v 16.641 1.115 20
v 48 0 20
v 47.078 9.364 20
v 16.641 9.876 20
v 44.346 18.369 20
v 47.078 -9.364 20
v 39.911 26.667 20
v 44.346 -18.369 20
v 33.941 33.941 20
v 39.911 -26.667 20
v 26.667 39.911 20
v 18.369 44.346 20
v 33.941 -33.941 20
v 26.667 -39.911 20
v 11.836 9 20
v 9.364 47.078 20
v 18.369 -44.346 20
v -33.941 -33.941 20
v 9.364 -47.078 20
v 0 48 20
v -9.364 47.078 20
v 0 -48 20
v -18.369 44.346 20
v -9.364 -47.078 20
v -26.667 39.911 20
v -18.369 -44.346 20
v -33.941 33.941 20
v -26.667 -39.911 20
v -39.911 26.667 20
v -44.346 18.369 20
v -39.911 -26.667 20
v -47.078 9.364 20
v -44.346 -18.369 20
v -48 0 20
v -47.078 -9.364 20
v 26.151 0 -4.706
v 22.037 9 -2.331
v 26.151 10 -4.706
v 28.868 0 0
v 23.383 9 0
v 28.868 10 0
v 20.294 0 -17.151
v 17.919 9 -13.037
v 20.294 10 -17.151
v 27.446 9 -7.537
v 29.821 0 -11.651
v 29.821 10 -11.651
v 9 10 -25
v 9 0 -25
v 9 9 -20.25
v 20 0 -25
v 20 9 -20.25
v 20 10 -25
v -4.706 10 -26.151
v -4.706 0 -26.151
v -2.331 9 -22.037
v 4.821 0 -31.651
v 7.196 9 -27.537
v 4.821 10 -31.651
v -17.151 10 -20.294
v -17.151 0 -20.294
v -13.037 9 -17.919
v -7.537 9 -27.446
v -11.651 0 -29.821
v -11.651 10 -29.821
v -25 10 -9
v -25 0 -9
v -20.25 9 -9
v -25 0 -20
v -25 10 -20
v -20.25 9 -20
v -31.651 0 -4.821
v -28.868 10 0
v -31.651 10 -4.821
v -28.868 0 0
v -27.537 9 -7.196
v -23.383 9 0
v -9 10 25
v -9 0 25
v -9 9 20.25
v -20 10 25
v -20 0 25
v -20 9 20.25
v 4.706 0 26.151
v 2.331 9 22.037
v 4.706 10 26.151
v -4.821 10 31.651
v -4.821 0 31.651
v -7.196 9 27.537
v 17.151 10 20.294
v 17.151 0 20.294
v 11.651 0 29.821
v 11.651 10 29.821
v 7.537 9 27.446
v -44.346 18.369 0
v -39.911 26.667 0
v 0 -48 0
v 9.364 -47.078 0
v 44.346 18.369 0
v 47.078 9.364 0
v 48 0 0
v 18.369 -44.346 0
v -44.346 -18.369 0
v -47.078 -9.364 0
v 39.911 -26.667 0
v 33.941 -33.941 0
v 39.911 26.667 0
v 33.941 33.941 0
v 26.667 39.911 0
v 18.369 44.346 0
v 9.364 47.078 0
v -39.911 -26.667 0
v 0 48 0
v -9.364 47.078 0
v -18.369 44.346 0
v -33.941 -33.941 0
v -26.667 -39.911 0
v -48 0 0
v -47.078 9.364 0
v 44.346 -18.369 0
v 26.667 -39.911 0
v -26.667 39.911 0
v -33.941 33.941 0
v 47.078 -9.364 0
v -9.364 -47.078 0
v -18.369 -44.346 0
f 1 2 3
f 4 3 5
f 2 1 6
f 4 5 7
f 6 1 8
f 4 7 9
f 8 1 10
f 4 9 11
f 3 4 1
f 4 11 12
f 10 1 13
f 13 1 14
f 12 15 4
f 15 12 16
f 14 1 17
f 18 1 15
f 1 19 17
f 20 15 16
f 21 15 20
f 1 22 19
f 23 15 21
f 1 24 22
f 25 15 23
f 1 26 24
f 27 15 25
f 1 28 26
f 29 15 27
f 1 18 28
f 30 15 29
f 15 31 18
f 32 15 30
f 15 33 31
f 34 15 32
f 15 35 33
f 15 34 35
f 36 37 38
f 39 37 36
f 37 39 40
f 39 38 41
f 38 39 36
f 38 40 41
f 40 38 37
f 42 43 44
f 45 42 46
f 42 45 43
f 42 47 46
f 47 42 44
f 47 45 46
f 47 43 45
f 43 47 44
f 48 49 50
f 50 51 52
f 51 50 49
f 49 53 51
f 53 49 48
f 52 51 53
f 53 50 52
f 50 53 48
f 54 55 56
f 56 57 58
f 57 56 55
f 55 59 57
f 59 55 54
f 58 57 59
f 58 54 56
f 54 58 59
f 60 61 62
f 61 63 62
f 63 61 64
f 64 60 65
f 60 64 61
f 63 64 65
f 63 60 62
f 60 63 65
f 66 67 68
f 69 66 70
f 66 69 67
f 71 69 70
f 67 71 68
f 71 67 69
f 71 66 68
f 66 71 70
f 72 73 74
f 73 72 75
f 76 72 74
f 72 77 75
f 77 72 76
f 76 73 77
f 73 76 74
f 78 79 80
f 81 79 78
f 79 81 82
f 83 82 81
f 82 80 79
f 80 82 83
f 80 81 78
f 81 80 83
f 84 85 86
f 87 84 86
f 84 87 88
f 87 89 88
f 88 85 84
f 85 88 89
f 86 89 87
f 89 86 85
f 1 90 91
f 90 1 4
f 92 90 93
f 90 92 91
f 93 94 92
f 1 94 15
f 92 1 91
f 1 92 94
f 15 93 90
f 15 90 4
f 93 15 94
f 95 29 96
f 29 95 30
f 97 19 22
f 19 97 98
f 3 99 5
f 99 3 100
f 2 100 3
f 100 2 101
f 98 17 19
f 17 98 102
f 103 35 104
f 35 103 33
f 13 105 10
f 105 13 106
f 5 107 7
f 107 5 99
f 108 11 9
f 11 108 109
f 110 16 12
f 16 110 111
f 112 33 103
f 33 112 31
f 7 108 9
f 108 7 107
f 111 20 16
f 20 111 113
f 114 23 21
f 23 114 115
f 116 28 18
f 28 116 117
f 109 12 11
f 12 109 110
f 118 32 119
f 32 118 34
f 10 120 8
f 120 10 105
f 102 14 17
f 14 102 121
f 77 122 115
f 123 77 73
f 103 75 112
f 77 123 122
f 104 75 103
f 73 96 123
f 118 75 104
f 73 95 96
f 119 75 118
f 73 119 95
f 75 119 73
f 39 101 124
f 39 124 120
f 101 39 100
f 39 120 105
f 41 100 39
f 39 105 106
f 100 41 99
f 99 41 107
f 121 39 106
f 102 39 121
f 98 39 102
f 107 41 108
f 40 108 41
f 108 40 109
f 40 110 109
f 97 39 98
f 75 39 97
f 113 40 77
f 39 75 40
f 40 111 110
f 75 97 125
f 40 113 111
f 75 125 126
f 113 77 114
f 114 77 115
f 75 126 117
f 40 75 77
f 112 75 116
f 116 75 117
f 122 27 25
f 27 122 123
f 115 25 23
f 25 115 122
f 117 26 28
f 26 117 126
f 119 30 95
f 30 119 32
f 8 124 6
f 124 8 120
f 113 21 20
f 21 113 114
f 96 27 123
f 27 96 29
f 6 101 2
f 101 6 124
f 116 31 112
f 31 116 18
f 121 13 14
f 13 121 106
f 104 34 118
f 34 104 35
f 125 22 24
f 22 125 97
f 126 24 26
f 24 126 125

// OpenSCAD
$fn = 32;
// ----------------------------------------------------------------------
// G-code: round hub with 5 bolt holes
// ----------------------------------------------------------------------
// --- parameters (mm) ---
base_d = 96;            // outer diameter of the hub
base_t = 10;            // base thickness
hole_d = 6;             // bolt hole diameter
hole_n = 5;             // number of bolt holes
spoke = 12;             // number of spokes
spoke_t = 3.5;          // spoke thickness
spoke_h = 10;           // spoke height
spoke_bore = 2.5;       // bore through the spoke
module hub() {
  /* round hub with a raised rim */
  cylinder(h = base_t + spoke_h, d = base_d);
}
module spoke() {
  /* spoke as a trapeze: larger diameter at the rim, smaller in the middle */
  translate([0, 0, base_t - 1])
    linear_extrude(height = spoke_h + 1)
      polygon(points = [[25, 0], [25, spoke_h], [20.25, spoke_h - 1]]);
}
module spokes() {
  for (i = [0 : spoke - 1])
    rotate([0, i * 360 / spoke]) spoke();
}
// --- overall assembly ---
union() {
  hub();
  spokes();
}
